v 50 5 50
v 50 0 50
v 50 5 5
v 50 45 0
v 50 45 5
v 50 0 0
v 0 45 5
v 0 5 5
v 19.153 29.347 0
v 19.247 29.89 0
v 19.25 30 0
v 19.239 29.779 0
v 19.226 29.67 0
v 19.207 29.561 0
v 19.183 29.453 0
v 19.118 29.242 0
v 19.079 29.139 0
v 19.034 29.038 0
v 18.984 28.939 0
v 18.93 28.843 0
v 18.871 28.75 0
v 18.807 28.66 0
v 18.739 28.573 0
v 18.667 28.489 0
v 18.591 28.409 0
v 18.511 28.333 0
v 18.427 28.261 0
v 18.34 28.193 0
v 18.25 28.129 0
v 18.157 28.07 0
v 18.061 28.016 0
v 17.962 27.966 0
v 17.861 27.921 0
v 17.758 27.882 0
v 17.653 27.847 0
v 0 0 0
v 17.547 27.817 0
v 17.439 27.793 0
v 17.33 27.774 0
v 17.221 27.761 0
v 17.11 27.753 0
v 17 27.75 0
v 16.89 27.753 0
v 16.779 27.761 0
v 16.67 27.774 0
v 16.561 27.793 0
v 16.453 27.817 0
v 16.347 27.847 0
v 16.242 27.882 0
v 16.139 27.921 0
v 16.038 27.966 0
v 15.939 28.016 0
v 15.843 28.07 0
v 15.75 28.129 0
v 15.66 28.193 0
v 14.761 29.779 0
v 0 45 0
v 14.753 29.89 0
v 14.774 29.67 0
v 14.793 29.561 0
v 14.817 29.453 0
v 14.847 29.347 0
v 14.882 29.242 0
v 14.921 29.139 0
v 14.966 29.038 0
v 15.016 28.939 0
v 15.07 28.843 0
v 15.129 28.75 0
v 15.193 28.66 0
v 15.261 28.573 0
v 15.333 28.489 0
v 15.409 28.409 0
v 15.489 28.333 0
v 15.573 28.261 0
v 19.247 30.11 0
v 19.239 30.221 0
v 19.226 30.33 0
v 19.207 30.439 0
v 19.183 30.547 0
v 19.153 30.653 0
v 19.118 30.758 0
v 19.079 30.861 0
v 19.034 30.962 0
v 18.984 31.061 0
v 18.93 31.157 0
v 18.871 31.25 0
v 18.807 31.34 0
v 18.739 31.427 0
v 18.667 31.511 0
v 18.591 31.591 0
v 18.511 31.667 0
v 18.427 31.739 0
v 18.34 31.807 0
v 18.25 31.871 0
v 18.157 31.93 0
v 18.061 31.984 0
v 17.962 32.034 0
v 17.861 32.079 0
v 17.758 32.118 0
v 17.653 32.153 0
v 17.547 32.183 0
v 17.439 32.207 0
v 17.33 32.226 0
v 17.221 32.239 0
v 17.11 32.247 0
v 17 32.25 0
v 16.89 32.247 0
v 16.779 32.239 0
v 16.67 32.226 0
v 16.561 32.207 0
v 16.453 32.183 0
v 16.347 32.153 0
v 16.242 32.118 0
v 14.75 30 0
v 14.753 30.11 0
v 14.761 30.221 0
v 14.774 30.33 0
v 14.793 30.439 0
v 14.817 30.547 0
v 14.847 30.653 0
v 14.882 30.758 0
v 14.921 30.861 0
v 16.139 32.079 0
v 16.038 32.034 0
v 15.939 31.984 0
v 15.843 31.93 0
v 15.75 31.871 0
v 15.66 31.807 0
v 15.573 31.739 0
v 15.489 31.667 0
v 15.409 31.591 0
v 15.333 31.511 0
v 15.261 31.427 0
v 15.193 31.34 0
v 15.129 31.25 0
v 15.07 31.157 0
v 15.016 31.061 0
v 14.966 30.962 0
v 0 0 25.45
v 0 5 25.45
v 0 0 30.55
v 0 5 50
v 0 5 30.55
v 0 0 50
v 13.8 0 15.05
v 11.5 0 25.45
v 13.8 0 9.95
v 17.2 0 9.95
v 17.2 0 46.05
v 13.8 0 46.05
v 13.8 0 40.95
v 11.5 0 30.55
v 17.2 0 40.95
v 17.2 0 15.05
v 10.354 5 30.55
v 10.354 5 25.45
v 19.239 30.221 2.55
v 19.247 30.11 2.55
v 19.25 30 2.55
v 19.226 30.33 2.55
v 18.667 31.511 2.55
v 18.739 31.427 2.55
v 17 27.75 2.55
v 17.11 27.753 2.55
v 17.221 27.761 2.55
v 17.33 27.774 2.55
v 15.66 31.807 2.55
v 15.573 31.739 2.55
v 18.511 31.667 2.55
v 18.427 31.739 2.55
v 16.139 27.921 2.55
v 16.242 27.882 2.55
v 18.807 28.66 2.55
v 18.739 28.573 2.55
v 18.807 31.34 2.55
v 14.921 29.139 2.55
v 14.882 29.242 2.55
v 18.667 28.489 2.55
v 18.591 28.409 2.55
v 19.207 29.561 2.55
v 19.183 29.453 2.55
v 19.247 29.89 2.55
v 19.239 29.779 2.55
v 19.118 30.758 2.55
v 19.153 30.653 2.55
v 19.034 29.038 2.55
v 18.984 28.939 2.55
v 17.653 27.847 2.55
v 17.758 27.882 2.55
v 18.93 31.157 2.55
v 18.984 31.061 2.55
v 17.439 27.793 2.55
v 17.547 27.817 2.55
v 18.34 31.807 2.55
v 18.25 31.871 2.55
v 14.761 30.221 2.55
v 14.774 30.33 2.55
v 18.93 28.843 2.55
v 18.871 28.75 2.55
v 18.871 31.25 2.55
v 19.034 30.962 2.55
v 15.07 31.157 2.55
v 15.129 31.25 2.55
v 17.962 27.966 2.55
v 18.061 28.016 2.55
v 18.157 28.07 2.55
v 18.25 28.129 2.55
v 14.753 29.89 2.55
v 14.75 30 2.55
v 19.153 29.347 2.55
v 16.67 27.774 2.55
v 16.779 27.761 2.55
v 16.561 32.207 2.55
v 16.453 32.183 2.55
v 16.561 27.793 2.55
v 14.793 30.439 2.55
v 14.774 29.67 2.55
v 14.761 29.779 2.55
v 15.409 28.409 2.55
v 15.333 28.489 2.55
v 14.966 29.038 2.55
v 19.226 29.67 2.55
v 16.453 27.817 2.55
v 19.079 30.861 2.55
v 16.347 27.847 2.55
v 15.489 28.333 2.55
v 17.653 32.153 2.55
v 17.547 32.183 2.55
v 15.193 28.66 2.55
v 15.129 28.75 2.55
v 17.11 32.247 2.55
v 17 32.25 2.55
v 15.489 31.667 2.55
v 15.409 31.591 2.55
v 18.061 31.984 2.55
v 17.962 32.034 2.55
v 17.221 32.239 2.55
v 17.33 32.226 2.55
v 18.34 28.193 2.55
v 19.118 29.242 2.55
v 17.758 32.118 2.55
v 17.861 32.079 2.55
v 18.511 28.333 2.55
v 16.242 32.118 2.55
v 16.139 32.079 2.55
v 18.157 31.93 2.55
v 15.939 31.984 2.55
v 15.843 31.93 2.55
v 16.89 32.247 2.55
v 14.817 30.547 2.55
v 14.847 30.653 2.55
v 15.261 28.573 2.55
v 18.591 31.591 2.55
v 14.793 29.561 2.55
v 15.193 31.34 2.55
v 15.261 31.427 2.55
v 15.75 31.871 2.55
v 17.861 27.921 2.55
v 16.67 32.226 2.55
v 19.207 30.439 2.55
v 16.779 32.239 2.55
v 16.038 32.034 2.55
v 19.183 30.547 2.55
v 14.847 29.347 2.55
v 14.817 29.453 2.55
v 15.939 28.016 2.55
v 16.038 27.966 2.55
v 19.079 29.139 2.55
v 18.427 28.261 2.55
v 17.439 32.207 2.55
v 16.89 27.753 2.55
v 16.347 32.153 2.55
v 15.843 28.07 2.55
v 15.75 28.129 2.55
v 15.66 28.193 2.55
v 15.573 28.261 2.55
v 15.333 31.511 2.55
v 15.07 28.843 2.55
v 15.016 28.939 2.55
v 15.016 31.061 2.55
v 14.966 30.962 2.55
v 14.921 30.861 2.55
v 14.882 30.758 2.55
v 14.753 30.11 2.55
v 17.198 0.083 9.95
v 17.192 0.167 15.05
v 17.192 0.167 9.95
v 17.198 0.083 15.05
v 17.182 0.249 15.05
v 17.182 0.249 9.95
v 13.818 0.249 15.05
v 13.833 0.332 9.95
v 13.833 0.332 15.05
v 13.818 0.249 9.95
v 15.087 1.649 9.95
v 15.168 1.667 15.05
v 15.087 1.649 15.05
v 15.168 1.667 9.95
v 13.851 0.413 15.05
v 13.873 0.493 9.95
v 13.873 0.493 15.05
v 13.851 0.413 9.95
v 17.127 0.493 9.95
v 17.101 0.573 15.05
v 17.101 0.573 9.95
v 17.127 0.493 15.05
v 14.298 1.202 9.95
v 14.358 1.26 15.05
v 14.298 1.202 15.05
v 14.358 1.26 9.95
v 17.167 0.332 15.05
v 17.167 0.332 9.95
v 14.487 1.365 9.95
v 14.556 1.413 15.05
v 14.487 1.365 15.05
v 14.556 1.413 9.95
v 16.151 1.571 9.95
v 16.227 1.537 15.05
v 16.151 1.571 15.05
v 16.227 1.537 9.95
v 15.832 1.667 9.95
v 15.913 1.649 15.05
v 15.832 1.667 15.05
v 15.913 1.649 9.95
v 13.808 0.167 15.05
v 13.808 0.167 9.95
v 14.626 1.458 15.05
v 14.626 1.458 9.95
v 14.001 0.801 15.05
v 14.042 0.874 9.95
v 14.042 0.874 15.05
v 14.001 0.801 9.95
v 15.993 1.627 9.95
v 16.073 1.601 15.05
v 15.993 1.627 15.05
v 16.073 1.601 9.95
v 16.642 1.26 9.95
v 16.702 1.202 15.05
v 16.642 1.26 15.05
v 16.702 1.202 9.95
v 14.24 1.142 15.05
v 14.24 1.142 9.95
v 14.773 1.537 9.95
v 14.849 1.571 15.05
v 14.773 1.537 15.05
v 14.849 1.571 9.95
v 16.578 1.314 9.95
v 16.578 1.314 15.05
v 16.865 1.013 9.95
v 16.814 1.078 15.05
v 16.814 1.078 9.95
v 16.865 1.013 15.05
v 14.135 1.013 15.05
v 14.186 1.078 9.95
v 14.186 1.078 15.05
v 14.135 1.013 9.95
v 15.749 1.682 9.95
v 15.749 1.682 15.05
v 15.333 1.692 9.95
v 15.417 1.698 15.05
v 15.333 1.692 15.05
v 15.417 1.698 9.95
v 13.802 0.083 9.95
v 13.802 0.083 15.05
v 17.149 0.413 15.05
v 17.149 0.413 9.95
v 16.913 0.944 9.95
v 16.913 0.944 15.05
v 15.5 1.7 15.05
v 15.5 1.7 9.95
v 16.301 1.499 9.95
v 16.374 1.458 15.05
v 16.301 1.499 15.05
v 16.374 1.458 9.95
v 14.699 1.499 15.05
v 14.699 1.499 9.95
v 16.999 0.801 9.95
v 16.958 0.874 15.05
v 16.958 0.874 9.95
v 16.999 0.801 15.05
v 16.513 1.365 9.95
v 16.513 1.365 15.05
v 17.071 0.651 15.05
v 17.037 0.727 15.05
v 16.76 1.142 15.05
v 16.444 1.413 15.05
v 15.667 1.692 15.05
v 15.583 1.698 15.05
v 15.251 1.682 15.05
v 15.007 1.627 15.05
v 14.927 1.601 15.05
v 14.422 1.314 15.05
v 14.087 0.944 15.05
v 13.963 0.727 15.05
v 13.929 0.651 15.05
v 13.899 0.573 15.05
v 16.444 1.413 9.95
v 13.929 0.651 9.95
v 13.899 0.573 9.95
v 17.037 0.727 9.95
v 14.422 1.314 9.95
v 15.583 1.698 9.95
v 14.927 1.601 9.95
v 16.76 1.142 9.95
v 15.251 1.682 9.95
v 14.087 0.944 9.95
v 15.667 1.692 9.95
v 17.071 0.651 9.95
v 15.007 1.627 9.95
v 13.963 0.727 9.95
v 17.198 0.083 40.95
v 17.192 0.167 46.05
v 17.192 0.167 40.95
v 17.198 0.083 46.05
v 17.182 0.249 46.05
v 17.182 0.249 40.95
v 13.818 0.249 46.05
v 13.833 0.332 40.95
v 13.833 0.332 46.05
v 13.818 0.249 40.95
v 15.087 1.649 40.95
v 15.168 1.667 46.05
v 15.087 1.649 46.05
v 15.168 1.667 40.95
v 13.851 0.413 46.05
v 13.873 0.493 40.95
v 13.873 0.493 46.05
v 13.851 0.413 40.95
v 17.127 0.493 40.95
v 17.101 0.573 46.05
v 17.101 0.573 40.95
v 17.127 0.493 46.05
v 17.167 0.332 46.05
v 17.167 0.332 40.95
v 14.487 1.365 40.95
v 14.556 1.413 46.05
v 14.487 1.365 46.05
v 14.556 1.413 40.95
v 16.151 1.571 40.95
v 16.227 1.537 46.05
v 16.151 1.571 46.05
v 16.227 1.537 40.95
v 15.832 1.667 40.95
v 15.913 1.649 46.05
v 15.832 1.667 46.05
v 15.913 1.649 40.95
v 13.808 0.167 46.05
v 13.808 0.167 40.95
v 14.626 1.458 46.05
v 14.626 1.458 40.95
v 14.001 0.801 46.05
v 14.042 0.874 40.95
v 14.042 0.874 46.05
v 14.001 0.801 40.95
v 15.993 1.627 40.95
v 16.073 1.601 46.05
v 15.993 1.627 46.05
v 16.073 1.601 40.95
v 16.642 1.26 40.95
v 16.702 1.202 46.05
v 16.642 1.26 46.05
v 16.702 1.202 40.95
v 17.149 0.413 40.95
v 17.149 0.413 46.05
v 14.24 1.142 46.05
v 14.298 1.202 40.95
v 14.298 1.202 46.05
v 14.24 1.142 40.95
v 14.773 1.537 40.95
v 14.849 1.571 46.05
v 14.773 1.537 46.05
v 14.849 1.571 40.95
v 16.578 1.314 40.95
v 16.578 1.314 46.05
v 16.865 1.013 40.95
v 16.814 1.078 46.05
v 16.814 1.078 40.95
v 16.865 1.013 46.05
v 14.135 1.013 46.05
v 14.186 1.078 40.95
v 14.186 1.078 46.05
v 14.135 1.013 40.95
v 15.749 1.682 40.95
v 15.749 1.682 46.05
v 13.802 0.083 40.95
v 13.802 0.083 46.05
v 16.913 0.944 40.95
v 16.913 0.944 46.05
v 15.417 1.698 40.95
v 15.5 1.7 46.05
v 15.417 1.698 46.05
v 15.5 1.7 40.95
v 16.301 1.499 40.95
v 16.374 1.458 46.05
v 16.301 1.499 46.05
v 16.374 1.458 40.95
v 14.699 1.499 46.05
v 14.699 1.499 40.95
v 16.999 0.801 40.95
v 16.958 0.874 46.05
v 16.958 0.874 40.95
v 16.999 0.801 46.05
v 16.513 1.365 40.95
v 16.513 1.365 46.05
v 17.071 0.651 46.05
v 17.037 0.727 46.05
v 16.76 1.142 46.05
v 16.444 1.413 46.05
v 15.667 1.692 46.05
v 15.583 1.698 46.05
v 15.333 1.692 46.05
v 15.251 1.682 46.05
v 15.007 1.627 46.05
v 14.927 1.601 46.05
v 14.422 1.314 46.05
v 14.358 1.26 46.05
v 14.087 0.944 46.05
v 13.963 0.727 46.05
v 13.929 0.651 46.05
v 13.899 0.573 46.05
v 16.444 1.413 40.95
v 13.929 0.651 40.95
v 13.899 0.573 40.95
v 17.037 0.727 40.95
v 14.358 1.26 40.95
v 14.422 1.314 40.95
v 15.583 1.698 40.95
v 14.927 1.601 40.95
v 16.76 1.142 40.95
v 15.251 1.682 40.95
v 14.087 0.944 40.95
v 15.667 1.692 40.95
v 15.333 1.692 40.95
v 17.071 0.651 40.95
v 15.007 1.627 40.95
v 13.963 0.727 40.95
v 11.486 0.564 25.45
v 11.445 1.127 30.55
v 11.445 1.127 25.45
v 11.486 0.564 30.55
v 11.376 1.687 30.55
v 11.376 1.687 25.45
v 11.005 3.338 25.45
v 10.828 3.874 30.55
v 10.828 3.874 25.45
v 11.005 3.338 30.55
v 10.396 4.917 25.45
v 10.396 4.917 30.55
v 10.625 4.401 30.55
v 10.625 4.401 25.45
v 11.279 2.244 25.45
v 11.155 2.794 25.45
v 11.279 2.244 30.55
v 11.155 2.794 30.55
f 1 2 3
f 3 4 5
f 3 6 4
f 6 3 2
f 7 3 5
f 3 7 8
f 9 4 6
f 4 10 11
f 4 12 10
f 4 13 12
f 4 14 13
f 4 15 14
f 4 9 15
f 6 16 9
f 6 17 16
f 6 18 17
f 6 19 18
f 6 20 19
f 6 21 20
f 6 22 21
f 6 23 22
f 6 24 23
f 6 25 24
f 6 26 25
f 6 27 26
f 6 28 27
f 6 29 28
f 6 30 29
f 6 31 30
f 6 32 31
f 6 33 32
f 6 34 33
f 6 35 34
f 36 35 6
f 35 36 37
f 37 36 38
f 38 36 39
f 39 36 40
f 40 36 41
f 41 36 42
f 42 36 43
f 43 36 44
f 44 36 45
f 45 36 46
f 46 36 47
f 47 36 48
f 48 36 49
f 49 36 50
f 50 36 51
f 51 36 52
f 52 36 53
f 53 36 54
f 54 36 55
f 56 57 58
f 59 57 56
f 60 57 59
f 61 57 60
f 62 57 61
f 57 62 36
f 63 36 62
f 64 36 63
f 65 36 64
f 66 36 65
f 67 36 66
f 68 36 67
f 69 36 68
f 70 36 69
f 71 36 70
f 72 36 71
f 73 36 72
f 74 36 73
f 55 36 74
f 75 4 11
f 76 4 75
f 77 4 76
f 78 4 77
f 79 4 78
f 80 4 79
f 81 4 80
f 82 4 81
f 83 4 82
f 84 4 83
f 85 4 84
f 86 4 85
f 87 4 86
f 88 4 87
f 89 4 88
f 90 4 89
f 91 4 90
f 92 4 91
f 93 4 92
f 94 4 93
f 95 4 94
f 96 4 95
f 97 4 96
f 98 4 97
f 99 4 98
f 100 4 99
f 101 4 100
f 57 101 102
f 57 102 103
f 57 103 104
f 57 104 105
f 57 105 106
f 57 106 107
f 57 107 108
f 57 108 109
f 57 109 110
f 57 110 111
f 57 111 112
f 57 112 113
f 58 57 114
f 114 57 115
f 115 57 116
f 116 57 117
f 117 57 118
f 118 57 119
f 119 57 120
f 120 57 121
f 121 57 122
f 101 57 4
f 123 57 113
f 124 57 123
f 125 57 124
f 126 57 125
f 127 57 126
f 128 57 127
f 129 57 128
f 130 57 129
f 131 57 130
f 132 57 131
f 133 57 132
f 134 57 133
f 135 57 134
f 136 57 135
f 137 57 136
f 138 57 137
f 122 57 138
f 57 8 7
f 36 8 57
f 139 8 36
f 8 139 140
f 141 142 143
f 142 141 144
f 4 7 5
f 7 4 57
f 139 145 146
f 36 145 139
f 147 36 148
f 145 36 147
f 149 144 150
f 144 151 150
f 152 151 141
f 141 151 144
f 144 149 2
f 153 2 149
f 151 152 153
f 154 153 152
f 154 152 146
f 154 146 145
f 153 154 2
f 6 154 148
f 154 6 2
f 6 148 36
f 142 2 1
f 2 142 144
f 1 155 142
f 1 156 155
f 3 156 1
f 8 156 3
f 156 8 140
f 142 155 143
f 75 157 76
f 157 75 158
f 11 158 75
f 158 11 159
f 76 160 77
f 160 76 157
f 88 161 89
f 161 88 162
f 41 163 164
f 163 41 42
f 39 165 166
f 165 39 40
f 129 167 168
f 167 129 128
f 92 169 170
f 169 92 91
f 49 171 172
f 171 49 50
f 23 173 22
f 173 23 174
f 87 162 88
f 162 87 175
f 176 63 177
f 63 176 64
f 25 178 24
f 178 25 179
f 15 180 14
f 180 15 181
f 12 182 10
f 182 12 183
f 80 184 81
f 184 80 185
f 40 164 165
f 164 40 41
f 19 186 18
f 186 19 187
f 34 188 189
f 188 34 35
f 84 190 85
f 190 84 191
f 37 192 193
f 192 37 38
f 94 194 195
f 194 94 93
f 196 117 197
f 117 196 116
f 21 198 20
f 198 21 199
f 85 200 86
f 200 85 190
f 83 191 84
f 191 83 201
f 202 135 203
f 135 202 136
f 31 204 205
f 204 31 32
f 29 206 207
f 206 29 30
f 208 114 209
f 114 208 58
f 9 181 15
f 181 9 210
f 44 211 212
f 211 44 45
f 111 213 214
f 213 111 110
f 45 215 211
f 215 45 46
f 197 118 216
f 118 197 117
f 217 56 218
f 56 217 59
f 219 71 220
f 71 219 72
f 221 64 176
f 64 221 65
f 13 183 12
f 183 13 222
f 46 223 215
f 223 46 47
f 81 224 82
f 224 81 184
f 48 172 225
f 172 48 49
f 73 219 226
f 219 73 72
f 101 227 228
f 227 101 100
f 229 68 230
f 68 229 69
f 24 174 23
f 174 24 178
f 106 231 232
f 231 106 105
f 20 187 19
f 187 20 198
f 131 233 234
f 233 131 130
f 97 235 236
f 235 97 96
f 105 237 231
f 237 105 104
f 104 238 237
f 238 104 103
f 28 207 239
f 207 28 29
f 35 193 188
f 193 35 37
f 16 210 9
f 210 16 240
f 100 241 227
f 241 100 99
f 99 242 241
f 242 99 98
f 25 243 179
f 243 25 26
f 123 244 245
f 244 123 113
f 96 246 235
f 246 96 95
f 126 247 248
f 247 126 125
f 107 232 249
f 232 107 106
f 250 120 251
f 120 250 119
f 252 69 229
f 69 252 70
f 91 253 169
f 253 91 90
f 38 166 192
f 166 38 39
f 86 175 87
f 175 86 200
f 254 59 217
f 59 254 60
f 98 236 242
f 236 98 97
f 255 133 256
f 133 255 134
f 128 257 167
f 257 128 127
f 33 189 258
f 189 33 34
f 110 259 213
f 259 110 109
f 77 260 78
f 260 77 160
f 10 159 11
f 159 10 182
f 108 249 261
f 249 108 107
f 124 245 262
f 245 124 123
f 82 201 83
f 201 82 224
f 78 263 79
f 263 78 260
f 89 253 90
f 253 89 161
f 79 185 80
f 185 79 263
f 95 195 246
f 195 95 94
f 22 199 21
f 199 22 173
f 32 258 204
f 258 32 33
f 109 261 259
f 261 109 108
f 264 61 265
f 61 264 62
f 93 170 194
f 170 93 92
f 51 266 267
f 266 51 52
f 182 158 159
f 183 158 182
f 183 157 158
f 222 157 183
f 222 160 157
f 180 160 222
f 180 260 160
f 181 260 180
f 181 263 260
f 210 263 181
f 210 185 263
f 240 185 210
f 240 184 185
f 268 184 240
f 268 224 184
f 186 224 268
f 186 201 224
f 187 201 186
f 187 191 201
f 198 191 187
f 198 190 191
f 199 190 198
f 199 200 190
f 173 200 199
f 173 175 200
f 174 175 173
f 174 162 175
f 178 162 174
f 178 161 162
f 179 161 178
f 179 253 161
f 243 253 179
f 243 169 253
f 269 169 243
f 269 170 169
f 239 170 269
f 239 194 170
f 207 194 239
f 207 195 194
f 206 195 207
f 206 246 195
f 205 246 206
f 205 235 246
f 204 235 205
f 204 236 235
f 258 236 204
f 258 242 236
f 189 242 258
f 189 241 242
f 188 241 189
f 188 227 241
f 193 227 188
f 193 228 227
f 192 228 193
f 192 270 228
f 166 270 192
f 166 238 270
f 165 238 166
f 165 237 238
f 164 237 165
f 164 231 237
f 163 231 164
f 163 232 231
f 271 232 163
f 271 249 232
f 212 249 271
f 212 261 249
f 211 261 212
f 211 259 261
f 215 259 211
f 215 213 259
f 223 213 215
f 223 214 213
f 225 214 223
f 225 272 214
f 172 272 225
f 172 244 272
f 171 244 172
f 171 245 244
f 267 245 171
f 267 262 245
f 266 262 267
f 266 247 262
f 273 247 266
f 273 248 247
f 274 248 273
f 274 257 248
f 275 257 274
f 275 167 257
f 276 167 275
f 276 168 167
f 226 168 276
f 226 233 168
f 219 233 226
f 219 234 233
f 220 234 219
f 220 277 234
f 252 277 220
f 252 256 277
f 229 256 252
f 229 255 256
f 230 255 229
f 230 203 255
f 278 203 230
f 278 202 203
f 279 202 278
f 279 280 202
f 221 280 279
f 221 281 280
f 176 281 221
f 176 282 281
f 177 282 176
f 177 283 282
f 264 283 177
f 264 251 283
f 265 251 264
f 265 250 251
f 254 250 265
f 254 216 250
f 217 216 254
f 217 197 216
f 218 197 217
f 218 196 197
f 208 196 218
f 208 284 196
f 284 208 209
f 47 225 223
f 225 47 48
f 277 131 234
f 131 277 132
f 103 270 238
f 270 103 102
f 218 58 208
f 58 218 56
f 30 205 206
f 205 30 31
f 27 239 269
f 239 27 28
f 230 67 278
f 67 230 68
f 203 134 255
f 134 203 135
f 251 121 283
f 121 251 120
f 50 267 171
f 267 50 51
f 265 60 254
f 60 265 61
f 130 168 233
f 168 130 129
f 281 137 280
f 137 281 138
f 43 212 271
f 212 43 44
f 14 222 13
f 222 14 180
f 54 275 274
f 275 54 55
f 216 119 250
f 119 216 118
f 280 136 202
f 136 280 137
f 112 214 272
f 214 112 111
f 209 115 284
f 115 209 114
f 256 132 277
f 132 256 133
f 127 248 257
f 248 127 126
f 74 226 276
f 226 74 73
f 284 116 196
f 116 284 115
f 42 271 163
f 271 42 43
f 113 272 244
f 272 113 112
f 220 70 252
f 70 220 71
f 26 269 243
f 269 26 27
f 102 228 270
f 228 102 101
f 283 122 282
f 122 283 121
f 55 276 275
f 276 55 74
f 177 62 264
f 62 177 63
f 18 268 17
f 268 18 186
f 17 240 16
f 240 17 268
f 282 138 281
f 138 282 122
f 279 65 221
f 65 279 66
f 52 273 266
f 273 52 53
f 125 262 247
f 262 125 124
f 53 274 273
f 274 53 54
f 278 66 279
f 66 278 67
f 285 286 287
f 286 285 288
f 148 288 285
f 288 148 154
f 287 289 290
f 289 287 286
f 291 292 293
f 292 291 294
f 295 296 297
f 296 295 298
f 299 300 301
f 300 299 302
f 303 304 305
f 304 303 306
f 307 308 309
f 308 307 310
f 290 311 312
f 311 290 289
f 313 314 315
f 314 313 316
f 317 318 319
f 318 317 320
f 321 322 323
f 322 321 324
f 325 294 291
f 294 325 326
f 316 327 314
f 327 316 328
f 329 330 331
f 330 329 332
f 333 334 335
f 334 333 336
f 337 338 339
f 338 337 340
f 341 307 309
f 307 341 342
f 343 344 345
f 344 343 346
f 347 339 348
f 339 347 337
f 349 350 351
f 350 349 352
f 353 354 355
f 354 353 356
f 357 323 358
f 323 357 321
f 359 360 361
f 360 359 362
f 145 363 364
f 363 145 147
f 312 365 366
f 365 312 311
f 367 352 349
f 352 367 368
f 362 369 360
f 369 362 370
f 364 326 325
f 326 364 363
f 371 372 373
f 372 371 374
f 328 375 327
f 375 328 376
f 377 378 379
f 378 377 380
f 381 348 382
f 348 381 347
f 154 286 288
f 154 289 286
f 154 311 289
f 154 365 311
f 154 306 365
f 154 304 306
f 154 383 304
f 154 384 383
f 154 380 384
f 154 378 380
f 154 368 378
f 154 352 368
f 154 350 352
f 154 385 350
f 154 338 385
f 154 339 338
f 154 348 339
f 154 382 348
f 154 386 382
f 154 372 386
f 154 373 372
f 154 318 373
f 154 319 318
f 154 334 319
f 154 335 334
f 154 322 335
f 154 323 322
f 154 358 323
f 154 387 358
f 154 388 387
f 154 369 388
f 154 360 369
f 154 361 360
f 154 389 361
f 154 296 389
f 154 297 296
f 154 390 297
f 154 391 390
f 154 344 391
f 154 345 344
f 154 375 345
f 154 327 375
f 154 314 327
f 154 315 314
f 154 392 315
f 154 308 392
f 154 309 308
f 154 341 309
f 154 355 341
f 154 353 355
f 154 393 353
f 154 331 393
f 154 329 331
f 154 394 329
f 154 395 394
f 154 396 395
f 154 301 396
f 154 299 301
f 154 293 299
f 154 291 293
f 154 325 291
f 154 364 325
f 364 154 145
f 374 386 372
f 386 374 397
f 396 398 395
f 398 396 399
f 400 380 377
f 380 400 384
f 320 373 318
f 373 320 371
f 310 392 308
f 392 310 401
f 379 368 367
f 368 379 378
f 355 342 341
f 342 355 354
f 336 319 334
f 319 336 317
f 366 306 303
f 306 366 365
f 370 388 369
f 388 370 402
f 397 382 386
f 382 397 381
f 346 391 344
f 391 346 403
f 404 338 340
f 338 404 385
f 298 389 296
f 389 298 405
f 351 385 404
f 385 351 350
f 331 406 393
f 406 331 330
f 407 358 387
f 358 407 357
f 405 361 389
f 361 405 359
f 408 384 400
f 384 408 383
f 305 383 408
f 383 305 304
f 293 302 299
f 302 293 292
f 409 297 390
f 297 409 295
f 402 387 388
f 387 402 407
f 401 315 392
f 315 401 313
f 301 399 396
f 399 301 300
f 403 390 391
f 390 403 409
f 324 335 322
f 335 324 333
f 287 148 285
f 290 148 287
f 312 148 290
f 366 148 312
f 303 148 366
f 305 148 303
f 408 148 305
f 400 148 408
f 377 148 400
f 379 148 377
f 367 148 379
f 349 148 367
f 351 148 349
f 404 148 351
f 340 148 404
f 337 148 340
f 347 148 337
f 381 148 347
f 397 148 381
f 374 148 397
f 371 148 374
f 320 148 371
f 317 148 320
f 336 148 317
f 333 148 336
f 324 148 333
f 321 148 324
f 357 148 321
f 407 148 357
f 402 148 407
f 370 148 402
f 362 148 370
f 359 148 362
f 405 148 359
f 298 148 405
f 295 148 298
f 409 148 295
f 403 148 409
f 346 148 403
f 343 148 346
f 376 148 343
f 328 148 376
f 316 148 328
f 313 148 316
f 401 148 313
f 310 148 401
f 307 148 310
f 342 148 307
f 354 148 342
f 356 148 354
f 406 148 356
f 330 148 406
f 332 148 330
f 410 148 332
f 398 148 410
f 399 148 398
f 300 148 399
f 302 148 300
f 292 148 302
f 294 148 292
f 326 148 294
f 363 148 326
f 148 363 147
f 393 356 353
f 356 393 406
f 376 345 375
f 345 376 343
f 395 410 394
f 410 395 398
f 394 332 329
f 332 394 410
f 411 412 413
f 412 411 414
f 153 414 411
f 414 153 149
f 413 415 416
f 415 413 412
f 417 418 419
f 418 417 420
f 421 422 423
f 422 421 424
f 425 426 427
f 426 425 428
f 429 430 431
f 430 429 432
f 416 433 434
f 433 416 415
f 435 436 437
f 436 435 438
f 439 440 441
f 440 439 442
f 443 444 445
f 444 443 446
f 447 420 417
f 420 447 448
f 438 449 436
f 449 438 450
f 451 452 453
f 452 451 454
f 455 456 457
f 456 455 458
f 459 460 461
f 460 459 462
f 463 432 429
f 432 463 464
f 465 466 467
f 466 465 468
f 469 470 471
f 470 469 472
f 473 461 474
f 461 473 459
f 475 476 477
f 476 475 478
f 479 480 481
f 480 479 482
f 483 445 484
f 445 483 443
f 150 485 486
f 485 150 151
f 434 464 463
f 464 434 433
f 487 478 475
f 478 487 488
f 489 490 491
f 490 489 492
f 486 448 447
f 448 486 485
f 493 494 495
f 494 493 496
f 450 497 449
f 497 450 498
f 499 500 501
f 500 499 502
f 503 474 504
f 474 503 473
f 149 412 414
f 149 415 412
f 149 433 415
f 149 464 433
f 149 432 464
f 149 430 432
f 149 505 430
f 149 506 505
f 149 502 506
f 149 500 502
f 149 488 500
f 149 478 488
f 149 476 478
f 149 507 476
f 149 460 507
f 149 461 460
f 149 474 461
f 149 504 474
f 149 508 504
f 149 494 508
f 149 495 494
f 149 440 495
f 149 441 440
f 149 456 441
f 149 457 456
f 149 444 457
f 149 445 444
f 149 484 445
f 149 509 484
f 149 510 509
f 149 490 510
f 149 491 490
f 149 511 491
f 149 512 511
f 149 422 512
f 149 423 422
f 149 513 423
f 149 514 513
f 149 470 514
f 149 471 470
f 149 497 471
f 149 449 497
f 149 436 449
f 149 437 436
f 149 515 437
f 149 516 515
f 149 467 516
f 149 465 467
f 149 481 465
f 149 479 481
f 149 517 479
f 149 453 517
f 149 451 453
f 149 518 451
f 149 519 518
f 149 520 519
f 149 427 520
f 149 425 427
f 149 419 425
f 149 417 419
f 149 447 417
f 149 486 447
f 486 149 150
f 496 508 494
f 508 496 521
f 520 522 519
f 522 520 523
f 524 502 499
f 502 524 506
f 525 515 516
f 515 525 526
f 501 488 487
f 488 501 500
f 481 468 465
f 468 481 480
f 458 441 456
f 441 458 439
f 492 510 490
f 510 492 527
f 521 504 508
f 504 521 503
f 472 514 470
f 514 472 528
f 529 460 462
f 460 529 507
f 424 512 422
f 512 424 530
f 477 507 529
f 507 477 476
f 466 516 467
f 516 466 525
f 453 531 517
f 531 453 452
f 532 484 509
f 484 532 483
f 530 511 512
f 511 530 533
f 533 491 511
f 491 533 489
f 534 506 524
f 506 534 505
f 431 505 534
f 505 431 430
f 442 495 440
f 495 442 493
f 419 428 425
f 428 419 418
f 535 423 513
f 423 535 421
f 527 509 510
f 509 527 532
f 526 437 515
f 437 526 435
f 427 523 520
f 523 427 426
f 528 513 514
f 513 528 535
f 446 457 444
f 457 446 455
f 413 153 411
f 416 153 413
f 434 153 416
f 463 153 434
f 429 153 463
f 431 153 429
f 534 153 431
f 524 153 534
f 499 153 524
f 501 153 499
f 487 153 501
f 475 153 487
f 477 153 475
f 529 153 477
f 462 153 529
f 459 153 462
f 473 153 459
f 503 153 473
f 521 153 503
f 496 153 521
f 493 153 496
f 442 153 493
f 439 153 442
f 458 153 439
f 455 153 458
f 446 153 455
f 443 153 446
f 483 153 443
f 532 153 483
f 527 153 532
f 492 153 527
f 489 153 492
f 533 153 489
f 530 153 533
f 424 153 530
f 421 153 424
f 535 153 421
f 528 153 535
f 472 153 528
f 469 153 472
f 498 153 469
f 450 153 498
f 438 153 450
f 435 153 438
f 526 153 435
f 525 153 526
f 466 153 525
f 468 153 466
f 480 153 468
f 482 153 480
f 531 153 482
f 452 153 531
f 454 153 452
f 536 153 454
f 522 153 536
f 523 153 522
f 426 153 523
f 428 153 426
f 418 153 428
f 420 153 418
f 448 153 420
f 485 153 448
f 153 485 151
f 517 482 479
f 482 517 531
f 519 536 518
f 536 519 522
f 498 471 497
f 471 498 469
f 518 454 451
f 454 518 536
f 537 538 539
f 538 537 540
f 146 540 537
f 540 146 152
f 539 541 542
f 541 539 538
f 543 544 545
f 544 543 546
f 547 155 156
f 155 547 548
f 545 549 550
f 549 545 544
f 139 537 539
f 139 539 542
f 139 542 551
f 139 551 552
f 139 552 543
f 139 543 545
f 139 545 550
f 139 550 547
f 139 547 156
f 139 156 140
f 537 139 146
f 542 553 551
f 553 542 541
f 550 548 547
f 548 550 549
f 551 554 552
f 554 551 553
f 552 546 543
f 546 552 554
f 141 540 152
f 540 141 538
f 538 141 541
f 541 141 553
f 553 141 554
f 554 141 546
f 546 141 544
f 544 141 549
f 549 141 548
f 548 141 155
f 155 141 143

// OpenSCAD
$fn = 128;

// --- Base Plate Dimensions ---
// X range: -25 to 25 (Width 50)
// Y range: 0 to 45 (Length 45)
// Z thickness: 5
BASE_X_MIN = -25;
BASE_X_MAX = 25;
BASE_Y_MIN = 0;
BASE_Y_MAX = 45;
BASE_Z_THICK = 5;

// --- Base Plate Mounting Holes (M4) ---
// Position: x = -17, y = 30 and x = 17, y = 30
// Diameter: 4.5 mm
BASE_HOLE_X1 = -17;
BASE_HOLE_Y1 = 30;
BASE_HOLE_X2 = 17;
BASE_HOLE_Y2 = 30;
BASE_HOLE_DIA = 4.5;

// --- Vertical Motor Plate Dimensions ---
// X range: -25 to 25 (Width 50)
// Y range: 0 to 5 (Thickness 5)
// Z height: 50
// Stands on the back edge of the base (y=0 to y=5)
MOTOR_X_MIN = -25;
MOTOR_X_MAX = 25;
MOTOR_Y_MIN = 0;
MOTOR_Y_MAX = 5;
MOTOR_Z_HEIGHT = 50;

// --- Motor Plate Boss Hole ---
// Diameter: 23 mm
// Centre: x = 0, z = 28
// Cut along Y axis
BOSS_HOLE_DIA = 23;
BOSS_HOLE_X = 0;
BOSS_HOLE_Z = 28;

// --- Motor Plate Screw Holes (M3) ---
// Diameter: 3.4 mm
// Pattern: 31 mm square centred on boss hole
// Boss hole is at x=0, z=28. Square is centred there.
// So square spans x: -15.5 to 15.5, z: 12.5 to 33.5
SCREW_HOLE_DIA = 3.4;
SCREW_PATTERN_SIZE = 31;
SCREW_PATTERN_HALF = SCREW_PATTERN_SIZE / 2;

// --- Gusset Dimensions ---
// Thickness: 5 mm (matches base and motor plate)
// Location: Left (x: -25 to -20) and Right (x: 20 to 25)
// Shape: Right triangle in YZ plane
// Legs: 20 mm along +Y and 20 mm along +Z
// Right-angle corner at y = 5, z = 5
// The triangle occupies Y from 5 to 25 and Z from 5 to 25.
GUSSET_X_WIDTH = 5;
GUSSET_Y_LEG = 20;
GUSSET_Z_LEG = 20;
GUSSET_Y_START = 5;
GUSSET_Z_START = 5;
GUSSET_THICK = 5;

// --- Main Body Construction ---
difference() {
    union() {
        // 1. Base Plate
        cube([
            BASE_X_MAX - BASE_X_MIN,
            BASE_Y_MAX - BASE_Y_MIN,
            BASE_Z_THICK
        ], center = false);

        // 2. Vertical Motor Plate
        translate([0, 0, 0]) {
            cube([
                MOTOR_X_MAX - MOTOR_X_MIN,
                MOTOR_Y_MAX - MOTOR_Y_MIN,
                MOTOR_Z_HEIGHT
            ], center = false);
        }

        // 3. Left Gusset
        // Right angle at y=5, z=5. Extends +Y and +Z.
        // X range: -25 to -20
        translate([-25, 5, 5]) {
            // Create a triangular prism using polygon extrusion
            // The polygon is in the XZ plane relative to the translation? 
            // No, we need to define the shape in the local coordinate system.
            // We want a triangle in the YZ plane (relative to the part) extruded along X.
            // Actually, simpler: define vertices in X, Y, Z.
            // Vertices: (-25, 5, 5), (-20, 5, 5), (-20, 25, 5), (-20, 5, 25), (-25, 5, 25), (-25, 5, 5)
            // Wait, the gusset is a right triangle in the YZ plane.
            // Leg 1 (Y): 5 to 25. Leg 2 (Z): 5 to 25.
            // Hypotenuse connects (y=25, z=5) and (y=5, z=25).
            // Extruded along X from -25 to -20.
            // Let's use linear_extrude on a polygon in the YZ plane, then rotate/translate.
            // Or just use polygon with 3D points.
            // Points: 
            // (-25, 5, 5) -> (-20, 5, 5) -> (-20, 25, 5) -> (-20, 5, 25) -> (-25, 5, 25) -> (-25, 5, 5)
            // This forms a triangular prism.
            polygon(
                points = [
                    [-25, 5, 5],
                    [-20, 5, 5],
                    [-20, 25, 5],
                    [-20, 5, 25],
                    [-25, 5, 25],
                    [-25, 5, 5]
                ]
            );
        }

        // 4. Right Gusset
        // X range: 20 to 25
        translate([20, 5, 5]) {
            polygon(
                points = [
                    [25, 5, 5],
                    [20, 5, 5],
                    [20, 25, 5],
                    [20, 5, 25],
                    [25, 5, 25],
                    [25, 5, 5]
                ]
            );
        }
    }

    // --- Cuts ---

    // 1. Base Plate Mounting Holes (M4)
    // Cut through Z (0 to 5)
    for (i = [0, 1]) {
        translate([
            (i == 0) ? BASE_HOLE_X1 : BASE_HOLE_X2,
            BASE_HOLE_Y1,
            0
        ]) {
            cylinder(
                h = BASE_Z_THICK + 0.1,
                d = BASE_HOLE_DIA,
                center = true
            );
        }
    }

    // 2. Motor Plate Boss Hole
    // Cut along Y axis (through the 5mm thick plate)
    // Center at x=0, z=28.
    translate([BOSS_HOLE_X, 0, BOSS_HOLE_Z]) {
        cylinder(
            h = MOTOR_Y_MAX - MOTOR_Y_MIN + 0.1,
            d = BOSS_HOLE_DIA,
            center = true
        );
    }

    // 3. Motor Plate Screw Holes (M3)
    // 4 holes on a 31mm square pattern centered on the boss hole.
    // Boss hole center: x=0, z=28.
    // Square center: x=0, z=28.
    // Square size: 31mm. Half-size: 15.5mm.
    // Corners: x = +/- 15.5, z = 28 +/- 15.5
    for (i = [0, 1, 2, 3]) {
        translate([
            (i == 0) ? -SCREW_PATTERN_HALF : (i == 1) ? SCREW_PATTERN_HALF : (i == 2) ? -SCREW_PATTERN_HALF : SCREW_PATTERN_HALF,
            0,
            (i == 0) ? 28 - SCREW_PATTERN_HALF : (i == 1) ? 28 - SCREW_PATTERN_HALF : (i == 2) ? 28 + SCREW_PATTERN_HALF : 28 + SCREW_PATTERN_HALF
        ]) {
            cylinder(
                h = MOTOR_Y_MAX - MOTOR_Y_MIN + 0.1,
                d = SCREW_HOLE_DIA,
                center = true
            );
        }
    }
}
